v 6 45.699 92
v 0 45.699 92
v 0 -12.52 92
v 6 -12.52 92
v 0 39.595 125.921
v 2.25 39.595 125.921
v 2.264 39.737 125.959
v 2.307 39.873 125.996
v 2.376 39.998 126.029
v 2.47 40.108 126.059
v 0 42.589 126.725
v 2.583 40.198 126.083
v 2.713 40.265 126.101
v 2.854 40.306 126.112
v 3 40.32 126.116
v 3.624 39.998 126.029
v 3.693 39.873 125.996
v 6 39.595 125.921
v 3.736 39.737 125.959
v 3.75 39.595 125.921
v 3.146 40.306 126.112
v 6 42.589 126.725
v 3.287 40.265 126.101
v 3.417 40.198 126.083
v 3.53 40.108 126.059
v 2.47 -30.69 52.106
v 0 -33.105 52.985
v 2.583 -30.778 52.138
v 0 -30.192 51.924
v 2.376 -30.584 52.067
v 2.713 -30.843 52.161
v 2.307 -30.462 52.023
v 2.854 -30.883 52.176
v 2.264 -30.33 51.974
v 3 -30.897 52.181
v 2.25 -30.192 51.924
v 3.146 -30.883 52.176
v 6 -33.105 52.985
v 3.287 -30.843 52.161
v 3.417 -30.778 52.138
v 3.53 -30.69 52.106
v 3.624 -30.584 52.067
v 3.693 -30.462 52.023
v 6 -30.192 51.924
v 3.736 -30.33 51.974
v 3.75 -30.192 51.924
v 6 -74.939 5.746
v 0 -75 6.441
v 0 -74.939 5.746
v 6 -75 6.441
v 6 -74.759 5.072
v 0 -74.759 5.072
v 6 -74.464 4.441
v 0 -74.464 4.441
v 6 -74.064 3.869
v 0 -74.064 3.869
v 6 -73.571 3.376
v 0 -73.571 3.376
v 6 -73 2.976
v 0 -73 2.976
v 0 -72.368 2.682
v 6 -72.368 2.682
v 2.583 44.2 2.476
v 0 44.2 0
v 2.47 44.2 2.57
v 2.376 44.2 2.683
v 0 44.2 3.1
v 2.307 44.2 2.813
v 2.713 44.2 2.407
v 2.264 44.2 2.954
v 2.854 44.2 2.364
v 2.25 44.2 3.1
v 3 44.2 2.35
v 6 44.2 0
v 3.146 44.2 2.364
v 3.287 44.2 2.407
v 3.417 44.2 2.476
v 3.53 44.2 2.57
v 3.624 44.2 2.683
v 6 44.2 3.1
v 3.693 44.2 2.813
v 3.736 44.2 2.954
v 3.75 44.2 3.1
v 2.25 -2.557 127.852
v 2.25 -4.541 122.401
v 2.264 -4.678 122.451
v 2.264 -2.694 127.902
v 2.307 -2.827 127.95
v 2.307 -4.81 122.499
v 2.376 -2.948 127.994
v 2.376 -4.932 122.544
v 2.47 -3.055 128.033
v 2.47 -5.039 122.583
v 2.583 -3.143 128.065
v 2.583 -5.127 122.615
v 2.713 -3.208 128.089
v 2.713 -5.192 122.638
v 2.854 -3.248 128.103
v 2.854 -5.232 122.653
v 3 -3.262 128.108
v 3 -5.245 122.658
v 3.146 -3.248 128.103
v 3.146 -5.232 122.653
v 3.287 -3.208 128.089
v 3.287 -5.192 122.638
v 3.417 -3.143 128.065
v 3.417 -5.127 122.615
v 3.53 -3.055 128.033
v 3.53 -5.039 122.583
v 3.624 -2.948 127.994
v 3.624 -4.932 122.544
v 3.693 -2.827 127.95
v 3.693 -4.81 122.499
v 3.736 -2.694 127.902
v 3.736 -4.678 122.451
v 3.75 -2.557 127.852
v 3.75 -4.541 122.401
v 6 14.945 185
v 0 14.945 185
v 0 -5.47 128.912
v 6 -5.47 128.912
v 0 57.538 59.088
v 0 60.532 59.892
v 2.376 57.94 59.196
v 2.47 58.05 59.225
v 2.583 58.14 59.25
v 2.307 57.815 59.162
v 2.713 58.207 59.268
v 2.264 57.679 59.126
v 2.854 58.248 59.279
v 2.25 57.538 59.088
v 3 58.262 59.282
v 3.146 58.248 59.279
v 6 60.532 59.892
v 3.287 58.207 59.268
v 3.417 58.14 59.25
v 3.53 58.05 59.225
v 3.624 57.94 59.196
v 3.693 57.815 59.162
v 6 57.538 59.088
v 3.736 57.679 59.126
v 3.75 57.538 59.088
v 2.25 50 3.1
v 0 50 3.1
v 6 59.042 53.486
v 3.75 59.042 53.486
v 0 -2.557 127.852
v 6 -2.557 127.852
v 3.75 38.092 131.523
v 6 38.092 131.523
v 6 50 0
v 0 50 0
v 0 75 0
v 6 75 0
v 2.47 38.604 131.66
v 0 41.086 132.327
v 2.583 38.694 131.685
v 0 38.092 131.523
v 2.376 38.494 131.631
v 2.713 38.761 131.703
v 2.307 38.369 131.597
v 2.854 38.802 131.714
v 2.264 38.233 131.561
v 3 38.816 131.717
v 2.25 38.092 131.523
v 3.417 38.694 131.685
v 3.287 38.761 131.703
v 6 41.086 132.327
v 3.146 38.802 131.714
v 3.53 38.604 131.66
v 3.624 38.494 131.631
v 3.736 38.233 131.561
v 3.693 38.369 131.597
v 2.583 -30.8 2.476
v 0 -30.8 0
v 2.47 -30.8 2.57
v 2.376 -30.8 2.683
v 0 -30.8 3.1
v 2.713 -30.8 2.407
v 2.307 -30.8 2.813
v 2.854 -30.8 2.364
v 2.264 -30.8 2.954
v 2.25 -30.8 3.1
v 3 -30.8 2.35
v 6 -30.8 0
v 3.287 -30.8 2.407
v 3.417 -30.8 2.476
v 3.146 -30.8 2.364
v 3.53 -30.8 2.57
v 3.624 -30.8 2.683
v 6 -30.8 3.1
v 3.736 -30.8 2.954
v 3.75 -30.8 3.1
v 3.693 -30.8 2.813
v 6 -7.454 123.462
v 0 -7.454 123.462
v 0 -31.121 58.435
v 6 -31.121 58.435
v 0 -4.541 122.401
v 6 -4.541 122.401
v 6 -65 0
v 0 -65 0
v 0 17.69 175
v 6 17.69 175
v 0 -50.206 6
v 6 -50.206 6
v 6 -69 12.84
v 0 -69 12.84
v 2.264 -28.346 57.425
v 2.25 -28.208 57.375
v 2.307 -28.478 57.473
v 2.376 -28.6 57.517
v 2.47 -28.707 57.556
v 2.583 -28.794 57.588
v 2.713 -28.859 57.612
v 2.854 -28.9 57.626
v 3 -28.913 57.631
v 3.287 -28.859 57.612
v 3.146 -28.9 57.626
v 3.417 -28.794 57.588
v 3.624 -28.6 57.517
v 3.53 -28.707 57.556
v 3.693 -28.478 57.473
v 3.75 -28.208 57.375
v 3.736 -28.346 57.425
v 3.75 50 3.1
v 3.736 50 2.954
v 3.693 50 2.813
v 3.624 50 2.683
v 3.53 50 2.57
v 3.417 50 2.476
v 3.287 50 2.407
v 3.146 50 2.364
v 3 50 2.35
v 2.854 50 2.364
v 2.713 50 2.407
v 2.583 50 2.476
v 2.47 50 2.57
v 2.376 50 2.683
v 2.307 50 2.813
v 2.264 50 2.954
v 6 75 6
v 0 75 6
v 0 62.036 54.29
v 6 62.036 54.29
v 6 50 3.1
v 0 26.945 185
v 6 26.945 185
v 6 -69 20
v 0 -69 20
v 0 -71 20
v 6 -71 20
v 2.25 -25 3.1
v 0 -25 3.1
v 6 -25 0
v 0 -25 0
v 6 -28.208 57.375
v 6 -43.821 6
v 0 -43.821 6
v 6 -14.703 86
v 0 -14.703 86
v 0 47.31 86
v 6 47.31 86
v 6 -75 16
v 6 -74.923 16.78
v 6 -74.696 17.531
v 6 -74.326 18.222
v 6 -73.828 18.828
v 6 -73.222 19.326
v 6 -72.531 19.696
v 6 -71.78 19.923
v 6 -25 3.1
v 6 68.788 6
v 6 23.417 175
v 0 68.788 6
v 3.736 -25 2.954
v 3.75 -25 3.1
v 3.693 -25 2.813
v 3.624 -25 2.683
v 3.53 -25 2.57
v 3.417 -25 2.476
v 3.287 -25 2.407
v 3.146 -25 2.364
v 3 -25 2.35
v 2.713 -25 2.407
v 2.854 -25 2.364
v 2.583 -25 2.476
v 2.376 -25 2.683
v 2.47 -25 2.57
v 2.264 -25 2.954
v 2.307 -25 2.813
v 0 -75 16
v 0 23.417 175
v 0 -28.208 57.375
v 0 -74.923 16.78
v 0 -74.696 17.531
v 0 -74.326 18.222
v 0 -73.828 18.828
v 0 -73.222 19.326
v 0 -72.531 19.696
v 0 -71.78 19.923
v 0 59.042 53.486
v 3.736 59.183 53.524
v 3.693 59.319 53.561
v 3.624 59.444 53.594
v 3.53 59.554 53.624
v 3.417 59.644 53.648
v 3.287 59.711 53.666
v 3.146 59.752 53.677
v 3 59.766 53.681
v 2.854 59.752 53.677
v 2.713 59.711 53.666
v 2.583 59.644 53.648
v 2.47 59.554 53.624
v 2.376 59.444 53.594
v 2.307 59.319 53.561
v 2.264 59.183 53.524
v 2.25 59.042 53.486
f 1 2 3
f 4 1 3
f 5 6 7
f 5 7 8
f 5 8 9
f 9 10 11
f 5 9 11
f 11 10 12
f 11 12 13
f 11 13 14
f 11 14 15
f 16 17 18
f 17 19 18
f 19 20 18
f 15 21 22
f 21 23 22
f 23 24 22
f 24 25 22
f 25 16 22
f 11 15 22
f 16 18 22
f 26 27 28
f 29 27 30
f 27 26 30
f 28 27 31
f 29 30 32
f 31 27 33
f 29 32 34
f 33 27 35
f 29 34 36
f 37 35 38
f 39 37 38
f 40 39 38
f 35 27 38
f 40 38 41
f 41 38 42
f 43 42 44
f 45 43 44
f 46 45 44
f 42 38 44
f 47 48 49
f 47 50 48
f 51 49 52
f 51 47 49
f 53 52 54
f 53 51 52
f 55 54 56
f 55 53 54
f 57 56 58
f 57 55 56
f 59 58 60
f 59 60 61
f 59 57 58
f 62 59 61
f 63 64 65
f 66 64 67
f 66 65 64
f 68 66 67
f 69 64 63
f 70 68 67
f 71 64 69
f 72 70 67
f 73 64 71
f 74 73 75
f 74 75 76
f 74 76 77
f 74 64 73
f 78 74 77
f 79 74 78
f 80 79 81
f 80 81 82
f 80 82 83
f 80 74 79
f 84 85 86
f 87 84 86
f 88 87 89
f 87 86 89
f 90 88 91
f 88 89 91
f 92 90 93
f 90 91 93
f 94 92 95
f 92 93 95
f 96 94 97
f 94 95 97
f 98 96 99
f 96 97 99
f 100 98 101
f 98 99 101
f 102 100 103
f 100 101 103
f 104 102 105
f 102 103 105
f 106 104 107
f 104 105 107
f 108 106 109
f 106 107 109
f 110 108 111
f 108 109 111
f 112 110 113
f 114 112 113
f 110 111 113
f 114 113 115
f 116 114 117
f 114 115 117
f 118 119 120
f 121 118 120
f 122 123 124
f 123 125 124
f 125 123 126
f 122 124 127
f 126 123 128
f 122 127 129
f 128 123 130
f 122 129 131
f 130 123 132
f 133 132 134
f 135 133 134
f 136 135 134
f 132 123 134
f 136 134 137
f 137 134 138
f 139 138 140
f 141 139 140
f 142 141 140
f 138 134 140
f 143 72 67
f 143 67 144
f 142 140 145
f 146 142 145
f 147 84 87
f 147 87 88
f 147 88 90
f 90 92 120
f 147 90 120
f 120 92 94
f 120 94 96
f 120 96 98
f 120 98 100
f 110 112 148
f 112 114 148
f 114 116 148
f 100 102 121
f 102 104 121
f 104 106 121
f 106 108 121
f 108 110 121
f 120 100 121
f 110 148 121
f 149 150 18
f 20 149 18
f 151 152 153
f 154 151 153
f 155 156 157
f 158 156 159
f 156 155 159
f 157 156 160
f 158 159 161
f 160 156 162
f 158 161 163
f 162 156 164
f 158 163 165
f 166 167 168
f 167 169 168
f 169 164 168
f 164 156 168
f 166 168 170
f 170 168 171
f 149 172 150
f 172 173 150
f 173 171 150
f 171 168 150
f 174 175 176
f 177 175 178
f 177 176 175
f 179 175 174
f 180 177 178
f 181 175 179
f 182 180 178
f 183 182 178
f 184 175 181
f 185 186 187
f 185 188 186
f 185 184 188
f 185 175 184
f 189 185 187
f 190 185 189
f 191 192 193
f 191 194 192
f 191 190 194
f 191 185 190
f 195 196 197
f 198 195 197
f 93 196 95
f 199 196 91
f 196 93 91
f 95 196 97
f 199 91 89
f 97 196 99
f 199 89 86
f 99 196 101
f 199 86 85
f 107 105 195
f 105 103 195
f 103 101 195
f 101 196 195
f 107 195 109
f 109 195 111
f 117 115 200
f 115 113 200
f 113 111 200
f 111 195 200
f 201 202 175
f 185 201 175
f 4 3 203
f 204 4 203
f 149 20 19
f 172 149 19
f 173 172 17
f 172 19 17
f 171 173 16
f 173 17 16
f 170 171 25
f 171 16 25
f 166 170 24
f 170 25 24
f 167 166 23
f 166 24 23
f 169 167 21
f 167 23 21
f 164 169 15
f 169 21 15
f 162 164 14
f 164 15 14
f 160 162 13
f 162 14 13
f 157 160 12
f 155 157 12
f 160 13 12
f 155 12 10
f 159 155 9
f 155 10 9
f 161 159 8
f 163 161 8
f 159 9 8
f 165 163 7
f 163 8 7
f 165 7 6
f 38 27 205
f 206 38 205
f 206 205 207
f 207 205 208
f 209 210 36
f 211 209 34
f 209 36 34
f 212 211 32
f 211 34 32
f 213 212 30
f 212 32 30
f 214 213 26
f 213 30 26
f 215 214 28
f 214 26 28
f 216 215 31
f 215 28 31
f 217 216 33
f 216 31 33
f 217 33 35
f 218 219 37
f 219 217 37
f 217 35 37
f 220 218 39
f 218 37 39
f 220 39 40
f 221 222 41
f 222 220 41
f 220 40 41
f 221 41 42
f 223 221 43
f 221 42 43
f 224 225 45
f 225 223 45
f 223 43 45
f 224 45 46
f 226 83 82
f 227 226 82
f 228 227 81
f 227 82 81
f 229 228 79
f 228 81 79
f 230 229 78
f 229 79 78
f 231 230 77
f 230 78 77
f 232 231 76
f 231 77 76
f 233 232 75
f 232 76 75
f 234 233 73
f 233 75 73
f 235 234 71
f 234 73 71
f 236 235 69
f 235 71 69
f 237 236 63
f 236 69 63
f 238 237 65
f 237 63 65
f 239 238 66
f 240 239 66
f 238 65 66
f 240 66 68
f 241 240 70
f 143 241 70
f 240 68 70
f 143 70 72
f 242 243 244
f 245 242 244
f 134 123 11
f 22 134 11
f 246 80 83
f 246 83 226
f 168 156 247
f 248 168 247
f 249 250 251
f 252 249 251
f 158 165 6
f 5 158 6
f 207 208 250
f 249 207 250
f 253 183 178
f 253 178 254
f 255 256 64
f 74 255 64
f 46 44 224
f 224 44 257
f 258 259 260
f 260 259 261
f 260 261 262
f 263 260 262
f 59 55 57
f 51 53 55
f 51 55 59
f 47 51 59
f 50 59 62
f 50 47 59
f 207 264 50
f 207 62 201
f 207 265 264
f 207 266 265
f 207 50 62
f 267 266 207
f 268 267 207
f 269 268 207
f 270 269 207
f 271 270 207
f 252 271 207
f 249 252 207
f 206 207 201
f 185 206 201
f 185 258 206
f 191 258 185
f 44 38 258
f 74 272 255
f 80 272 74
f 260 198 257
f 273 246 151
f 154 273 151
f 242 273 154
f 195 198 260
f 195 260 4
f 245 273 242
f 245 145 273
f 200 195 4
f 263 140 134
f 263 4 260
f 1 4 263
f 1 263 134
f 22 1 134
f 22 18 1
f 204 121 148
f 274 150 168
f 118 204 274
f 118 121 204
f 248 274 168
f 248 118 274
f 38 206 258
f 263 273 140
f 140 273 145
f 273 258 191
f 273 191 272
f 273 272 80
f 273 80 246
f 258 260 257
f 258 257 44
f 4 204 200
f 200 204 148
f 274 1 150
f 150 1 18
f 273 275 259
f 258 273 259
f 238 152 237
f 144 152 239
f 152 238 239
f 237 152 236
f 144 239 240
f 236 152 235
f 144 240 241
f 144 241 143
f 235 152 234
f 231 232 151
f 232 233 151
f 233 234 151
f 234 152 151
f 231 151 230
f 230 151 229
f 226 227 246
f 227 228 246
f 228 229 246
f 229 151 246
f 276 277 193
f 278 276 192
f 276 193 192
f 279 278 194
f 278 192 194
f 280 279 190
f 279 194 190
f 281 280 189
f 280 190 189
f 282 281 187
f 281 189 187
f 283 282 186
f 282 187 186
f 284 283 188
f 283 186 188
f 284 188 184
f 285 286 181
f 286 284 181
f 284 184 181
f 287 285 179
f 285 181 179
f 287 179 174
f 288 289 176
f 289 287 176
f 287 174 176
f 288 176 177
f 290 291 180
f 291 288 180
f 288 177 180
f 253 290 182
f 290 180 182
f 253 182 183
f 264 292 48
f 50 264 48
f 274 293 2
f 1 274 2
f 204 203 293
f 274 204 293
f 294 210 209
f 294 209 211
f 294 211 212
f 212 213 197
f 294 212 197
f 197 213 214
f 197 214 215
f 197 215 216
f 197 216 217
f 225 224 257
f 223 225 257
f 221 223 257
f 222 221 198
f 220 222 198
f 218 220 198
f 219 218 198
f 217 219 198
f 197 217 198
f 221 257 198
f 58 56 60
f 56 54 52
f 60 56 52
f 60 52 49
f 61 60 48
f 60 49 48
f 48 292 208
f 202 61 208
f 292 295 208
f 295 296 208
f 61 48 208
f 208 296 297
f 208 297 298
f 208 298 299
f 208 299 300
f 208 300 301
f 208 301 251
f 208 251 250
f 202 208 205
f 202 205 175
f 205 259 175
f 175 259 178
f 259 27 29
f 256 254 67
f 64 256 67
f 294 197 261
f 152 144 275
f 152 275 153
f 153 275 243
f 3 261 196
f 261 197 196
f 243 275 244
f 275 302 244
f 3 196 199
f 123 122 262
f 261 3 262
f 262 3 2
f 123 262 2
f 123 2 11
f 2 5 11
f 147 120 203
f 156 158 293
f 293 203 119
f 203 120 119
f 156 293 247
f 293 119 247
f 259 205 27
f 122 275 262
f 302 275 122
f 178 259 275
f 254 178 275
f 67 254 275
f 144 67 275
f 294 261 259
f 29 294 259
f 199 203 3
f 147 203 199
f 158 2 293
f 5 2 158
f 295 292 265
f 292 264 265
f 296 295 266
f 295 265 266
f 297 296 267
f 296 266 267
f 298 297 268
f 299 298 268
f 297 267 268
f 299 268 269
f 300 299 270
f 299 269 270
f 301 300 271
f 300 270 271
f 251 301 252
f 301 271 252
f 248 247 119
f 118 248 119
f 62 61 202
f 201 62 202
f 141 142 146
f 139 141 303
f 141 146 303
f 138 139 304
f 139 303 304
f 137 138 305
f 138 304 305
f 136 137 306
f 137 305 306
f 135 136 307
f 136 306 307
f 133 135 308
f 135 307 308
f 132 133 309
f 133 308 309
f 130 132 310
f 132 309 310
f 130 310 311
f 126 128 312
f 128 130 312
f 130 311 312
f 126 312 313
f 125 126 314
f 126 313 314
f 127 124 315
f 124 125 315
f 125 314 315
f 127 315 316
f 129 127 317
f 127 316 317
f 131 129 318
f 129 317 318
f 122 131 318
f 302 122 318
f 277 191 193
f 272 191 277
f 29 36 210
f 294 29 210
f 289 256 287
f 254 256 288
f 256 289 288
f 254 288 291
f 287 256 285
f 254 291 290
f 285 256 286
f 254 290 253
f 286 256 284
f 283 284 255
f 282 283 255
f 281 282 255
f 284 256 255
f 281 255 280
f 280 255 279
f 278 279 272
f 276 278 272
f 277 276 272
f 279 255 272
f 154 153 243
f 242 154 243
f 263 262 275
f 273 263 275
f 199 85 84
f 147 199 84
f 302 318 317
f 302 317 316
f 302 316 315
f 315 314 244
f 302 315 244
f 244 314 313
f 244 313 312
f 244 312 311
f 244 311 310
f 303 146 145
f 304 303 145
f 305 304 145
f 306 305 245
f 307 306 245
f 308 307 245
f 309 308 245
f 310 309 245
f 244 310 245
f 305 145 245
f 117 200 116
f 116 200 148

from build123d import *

# Parameters (mm, degrees)
F1_DEPTH = 6
F2_W     = 5.8
F2_H     = 3.1
F3_DEPTH = 25
F5_DEPTH = 80.8
F7_DEPTH = 80.8
F9_DEPTH = 80.8
F10_R    = 4


with BuildPart() as f1:
    # F0 (on Right) → F1 (new body)
    with BuildSketch(Plane.YZ):
        Polygon((-75, 3.6397023427), (-65, 0), (75, 0), (75, 6), (26.9445243494, 185), (14.9445243494, 185), (-50.2061475843, 6), (-69, 12.8404028665), (-69, 20), (-75, 20), align=None)
        Polygon((68.7875391018, 6), (-43.8210809494, 6), (-14.7034622081, 86), (47.3102315485, 86), align=None, mode=Mode.SUBTRACT)
        Polygon((-12.5196408025, 92), (17.6898886416, 175), (23.4167268954, 175), (45.699433482, 92), align=None, mode=Mode.SUBTRACT)
    extrude(amount=F1_DEPTH)

    # F2 (on face) → F3 (cut)
    with BuildSketch(Plane.YZ.offset(6)):
        with Locations((-27.9, 1.55)):
            Rectangle(F2_W, F2_H)
        with Locations((47.1, 1.55)):
            Rectangle(F2_W, F2_H)
        Polygon((-5.4699128373, 128.9117947988), (-7.4536296686, 123.4615775982), (-4.5405825441, 122.4013151539), (-2.5568657128, 127.8515323545), align=None)
        Polygon((-31.1214235867, 58.4348482399), (-33.105140418, 52.9846310393), (-30.1920932936, 51.924368595), (-28.2083764623, 57.3745857955), align=None)
        Polygon((59.0417662259, 53.4862587999), (62.0357488529, 54.290042371), (60.5318957199, 59.8916872861), (57.5379130928, 59.0879037149), align=None)
        Polygon((39.5953895053, 125.9213223564), (42.5893721323, 126.7251059276), (41.0855189992, 132.3267508426), (38.0915363722, 131.5229672715), align=None)
    extrude(amount=-F3_DEPTH, mode=Mode.SUBTRACT)

    # F4 (on face) → F5 (join, through all)
    with BuildSketch(Plane(origin=(0, 13.1563663869, 36.14681957), x_dir=(1, 0, 0), z_dir=(0, 0.3420201433, 0.9396926208))):
        with BuildLine():
            ThreePointArc((2.25, -46.130467263), (3, -46.880467263), (3.75, -46.130467263))
            Line((3.75, -46.130467263), (2.25, -46.130467263))
        make_face()
    extrude(amount=F5_DEPTH)

    # F6 (on face) → F7 (join, through all)
    with BuildSketch(Plane(origin=(0, -30.8, 0), x_dir=(-1, 0, 0), z_dir=(0, 1, 0))):
        with BuildLine():
            ThreePointArc((-3.75, 3.1), (-3, 2.35), (-2.25, 3.1))
            Line((-2.25, 3.1), (-3.75, 3.1))
        make_face()
    extrude(amount=F7_DEPTH)

    # F8 (on face) → F9 (join, through all)
    with BuildSketch(Plane(origin=(0, -9.4246030822, 35.1053429162), x_dir=(1, 0, 0), z_dir=(0, -0.2592850229, 0.9658008474))):
        with BuildLine():
            Line((2.25, 70.8907736942), (3.75, 70.8907736942))
            ThreePointArc((3.75, 70.8907736942), (3, 71.6407736942), (2.25, 70.8907736942))
        make_face()
    extrude(amount=F9_DEPTH)

    # F10
    f10_edges = [f1.edges().sort_by_distance(p)[0] for p in [
        (3, -75, 3.639702),
        (3, -75, 20),
    ]]
    fillet(f10_edges, radius=F10_R)


solid = f1.part
